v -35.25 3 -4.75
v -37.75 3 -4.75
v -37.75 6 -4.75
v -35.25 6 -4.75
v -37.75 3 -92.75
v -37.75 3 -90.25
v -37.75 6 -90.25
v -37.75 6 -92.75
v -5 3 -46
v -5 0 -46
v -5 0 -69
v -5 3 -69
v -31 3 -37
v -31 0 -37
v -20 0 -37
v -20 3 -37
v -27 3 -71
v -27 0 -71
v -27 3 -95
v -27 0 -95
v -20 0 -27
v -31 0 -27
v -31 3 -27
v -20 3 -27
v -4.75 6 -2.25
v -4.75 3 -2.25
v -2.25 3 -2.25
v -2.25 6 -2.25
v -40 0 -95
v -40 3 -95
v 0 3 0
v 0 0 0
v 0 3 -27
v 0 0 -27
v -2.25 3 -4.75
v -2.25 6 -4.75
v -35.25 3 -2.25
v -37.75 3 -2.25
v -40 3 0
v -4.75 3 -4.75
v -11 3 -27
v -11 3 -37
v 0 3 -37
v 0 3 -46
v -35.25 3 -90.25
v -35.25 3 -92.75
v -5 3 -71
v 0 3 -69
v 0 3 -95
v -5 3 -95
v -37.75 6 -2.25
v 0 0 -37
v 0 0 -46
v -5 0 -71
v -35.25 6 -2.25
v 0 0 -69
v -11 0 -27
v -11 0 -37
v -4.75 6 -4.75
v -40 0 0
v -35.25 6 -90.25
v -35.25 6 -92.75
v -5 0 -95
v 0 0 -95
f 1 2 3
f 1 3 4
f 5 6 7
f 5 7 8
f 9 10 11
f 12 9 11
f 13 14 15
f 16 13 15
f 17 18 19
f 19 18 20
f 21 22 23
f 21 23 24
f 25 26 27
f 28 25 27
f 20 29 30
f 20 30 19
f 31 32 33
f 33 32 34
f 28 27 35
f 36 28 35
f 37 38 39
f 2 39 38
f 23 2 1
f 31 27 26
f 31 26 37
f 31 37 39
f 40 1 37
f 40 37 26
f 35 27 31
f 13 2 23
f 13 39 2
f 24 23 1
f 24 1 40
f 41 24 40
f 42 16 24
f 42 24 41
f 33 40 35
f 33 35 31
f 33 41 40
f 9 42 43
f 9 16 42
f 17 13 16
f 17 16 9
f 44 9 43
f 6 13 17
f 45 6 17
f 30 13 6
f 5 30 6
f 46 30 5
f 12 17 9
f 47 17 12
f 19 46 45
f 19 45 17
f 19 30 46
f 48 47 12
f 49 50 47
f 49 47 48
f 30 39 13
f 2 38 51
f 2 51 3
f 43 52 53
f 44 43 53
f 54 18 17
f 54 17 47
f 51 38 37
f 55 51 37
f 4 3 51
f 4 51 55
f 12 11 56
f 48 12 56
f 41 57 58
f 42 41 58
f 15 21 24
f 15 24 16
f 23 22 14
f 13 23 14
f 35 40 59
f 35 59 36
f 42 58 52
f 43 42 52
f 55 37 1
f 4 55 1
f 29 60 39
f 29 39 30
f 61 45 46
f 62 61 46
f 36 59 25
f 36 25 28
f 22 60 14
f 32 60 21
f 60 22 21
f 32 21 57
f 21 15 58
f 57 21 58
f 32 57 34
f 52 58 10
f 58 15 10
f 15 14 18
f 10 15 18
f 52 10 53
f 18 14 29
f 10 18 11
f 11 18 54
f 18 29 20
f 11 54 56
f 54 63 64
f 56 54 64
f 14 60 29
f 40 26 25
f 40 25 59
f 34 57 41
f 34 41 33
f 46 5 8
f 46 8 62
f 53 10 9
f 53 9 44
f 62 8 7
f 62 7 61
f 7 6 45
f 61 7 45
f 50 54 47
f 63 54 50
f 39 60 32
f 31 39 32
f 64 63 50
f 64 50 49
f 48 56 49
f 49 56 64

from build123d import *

# Parameters (mm, degrees)
SKETCH1_W               = 40
SKETCH1_H               = 95
BOSS_EXTRUDE1_DEPTH     = 3
SKETCH2_W               = 2.5
SKETCH2_H               = 2.5
BOSS_EXTRUDE2_DEPTH     = 3
CUT_EXTRUDE1_DEPTH      = 104.121287812
CUT_EXTRUDE1_DEPTH_BACK = 104.121287812
SKETCH3_W               = 22
SKETCH3_H               = 24
SKETCH3_W_2             = 5
SKETCH3_H_2             = 23
SKETCH3_W_3             = 11
SKETCH3_H_3             = 10


with BuildPart() as part:
    # Sketch1 → Boss-Extrude1 (new body)
    with BuildSketch(Plane(origin=(0, 0, 0), x_dir=(1, 0, 0), z_dir=(0, 1, 0))):
        with Locations((-20, 47.5)):
            Rectangle(SKETCH1_W, SKETCH1_H)
    extrude(amount=BOSS_EXTRUDE1_DEPTH)

    # Sketch2 → Boss-Extrude2 (add)
    with BuildSketch(Plane(origin=(0, 3, 0), x_dir=(1, 0, 0), z_dir=(0, 1, 0))):
        with Locations((-3.5, 3.5)):
            Rectangle(SKETCH2_W, SKETCH2_H)
        with Locations((-36.5, 3.5)):
            Rectangle(SKETCH2_W, SKETCH2_H)
        with Locations((-36.5, 91.5)):
            Rectangle(SKETCH2_W, SKETCH2_H)
    extrude(amount=BOSS_EXTRUDE2_DEPTH)

    # Sketch3 → Cut-Extrude1 (cut, two sides: drawn at the far end of the back side and taken through both)
    with BuildSketch(Plane(origin=(0, 3, 0), x_dir=(1, 0, 0), z_dir=(0, 1, 0)).offset(-CUT_EXTRUDE1_DEPTH_BACK)):
        with Locations((-16, 83)):
            Rectangle(SKETCH3_W, SKETCH3_H)
        with Locations((-2.5, 57.5)):
            Rectangle(SKETCH3_W_2, SKETCH3_H_2)
        with Locations((-5.5, 32)):
            Rectangle(SKETCH3_W_3, SKETCH3_H_3)
        with Locations((-25.5, 32)):
            Rectangle(SKETCH3_W_3, SKETCH3_H_3)
    extrude(amount=CUT_EXTRUDE1_DEPTH + CUT_EXTRUDE1_DEPTH_BACK, mode=Mode.SUBTRACT)


solid = part.part
